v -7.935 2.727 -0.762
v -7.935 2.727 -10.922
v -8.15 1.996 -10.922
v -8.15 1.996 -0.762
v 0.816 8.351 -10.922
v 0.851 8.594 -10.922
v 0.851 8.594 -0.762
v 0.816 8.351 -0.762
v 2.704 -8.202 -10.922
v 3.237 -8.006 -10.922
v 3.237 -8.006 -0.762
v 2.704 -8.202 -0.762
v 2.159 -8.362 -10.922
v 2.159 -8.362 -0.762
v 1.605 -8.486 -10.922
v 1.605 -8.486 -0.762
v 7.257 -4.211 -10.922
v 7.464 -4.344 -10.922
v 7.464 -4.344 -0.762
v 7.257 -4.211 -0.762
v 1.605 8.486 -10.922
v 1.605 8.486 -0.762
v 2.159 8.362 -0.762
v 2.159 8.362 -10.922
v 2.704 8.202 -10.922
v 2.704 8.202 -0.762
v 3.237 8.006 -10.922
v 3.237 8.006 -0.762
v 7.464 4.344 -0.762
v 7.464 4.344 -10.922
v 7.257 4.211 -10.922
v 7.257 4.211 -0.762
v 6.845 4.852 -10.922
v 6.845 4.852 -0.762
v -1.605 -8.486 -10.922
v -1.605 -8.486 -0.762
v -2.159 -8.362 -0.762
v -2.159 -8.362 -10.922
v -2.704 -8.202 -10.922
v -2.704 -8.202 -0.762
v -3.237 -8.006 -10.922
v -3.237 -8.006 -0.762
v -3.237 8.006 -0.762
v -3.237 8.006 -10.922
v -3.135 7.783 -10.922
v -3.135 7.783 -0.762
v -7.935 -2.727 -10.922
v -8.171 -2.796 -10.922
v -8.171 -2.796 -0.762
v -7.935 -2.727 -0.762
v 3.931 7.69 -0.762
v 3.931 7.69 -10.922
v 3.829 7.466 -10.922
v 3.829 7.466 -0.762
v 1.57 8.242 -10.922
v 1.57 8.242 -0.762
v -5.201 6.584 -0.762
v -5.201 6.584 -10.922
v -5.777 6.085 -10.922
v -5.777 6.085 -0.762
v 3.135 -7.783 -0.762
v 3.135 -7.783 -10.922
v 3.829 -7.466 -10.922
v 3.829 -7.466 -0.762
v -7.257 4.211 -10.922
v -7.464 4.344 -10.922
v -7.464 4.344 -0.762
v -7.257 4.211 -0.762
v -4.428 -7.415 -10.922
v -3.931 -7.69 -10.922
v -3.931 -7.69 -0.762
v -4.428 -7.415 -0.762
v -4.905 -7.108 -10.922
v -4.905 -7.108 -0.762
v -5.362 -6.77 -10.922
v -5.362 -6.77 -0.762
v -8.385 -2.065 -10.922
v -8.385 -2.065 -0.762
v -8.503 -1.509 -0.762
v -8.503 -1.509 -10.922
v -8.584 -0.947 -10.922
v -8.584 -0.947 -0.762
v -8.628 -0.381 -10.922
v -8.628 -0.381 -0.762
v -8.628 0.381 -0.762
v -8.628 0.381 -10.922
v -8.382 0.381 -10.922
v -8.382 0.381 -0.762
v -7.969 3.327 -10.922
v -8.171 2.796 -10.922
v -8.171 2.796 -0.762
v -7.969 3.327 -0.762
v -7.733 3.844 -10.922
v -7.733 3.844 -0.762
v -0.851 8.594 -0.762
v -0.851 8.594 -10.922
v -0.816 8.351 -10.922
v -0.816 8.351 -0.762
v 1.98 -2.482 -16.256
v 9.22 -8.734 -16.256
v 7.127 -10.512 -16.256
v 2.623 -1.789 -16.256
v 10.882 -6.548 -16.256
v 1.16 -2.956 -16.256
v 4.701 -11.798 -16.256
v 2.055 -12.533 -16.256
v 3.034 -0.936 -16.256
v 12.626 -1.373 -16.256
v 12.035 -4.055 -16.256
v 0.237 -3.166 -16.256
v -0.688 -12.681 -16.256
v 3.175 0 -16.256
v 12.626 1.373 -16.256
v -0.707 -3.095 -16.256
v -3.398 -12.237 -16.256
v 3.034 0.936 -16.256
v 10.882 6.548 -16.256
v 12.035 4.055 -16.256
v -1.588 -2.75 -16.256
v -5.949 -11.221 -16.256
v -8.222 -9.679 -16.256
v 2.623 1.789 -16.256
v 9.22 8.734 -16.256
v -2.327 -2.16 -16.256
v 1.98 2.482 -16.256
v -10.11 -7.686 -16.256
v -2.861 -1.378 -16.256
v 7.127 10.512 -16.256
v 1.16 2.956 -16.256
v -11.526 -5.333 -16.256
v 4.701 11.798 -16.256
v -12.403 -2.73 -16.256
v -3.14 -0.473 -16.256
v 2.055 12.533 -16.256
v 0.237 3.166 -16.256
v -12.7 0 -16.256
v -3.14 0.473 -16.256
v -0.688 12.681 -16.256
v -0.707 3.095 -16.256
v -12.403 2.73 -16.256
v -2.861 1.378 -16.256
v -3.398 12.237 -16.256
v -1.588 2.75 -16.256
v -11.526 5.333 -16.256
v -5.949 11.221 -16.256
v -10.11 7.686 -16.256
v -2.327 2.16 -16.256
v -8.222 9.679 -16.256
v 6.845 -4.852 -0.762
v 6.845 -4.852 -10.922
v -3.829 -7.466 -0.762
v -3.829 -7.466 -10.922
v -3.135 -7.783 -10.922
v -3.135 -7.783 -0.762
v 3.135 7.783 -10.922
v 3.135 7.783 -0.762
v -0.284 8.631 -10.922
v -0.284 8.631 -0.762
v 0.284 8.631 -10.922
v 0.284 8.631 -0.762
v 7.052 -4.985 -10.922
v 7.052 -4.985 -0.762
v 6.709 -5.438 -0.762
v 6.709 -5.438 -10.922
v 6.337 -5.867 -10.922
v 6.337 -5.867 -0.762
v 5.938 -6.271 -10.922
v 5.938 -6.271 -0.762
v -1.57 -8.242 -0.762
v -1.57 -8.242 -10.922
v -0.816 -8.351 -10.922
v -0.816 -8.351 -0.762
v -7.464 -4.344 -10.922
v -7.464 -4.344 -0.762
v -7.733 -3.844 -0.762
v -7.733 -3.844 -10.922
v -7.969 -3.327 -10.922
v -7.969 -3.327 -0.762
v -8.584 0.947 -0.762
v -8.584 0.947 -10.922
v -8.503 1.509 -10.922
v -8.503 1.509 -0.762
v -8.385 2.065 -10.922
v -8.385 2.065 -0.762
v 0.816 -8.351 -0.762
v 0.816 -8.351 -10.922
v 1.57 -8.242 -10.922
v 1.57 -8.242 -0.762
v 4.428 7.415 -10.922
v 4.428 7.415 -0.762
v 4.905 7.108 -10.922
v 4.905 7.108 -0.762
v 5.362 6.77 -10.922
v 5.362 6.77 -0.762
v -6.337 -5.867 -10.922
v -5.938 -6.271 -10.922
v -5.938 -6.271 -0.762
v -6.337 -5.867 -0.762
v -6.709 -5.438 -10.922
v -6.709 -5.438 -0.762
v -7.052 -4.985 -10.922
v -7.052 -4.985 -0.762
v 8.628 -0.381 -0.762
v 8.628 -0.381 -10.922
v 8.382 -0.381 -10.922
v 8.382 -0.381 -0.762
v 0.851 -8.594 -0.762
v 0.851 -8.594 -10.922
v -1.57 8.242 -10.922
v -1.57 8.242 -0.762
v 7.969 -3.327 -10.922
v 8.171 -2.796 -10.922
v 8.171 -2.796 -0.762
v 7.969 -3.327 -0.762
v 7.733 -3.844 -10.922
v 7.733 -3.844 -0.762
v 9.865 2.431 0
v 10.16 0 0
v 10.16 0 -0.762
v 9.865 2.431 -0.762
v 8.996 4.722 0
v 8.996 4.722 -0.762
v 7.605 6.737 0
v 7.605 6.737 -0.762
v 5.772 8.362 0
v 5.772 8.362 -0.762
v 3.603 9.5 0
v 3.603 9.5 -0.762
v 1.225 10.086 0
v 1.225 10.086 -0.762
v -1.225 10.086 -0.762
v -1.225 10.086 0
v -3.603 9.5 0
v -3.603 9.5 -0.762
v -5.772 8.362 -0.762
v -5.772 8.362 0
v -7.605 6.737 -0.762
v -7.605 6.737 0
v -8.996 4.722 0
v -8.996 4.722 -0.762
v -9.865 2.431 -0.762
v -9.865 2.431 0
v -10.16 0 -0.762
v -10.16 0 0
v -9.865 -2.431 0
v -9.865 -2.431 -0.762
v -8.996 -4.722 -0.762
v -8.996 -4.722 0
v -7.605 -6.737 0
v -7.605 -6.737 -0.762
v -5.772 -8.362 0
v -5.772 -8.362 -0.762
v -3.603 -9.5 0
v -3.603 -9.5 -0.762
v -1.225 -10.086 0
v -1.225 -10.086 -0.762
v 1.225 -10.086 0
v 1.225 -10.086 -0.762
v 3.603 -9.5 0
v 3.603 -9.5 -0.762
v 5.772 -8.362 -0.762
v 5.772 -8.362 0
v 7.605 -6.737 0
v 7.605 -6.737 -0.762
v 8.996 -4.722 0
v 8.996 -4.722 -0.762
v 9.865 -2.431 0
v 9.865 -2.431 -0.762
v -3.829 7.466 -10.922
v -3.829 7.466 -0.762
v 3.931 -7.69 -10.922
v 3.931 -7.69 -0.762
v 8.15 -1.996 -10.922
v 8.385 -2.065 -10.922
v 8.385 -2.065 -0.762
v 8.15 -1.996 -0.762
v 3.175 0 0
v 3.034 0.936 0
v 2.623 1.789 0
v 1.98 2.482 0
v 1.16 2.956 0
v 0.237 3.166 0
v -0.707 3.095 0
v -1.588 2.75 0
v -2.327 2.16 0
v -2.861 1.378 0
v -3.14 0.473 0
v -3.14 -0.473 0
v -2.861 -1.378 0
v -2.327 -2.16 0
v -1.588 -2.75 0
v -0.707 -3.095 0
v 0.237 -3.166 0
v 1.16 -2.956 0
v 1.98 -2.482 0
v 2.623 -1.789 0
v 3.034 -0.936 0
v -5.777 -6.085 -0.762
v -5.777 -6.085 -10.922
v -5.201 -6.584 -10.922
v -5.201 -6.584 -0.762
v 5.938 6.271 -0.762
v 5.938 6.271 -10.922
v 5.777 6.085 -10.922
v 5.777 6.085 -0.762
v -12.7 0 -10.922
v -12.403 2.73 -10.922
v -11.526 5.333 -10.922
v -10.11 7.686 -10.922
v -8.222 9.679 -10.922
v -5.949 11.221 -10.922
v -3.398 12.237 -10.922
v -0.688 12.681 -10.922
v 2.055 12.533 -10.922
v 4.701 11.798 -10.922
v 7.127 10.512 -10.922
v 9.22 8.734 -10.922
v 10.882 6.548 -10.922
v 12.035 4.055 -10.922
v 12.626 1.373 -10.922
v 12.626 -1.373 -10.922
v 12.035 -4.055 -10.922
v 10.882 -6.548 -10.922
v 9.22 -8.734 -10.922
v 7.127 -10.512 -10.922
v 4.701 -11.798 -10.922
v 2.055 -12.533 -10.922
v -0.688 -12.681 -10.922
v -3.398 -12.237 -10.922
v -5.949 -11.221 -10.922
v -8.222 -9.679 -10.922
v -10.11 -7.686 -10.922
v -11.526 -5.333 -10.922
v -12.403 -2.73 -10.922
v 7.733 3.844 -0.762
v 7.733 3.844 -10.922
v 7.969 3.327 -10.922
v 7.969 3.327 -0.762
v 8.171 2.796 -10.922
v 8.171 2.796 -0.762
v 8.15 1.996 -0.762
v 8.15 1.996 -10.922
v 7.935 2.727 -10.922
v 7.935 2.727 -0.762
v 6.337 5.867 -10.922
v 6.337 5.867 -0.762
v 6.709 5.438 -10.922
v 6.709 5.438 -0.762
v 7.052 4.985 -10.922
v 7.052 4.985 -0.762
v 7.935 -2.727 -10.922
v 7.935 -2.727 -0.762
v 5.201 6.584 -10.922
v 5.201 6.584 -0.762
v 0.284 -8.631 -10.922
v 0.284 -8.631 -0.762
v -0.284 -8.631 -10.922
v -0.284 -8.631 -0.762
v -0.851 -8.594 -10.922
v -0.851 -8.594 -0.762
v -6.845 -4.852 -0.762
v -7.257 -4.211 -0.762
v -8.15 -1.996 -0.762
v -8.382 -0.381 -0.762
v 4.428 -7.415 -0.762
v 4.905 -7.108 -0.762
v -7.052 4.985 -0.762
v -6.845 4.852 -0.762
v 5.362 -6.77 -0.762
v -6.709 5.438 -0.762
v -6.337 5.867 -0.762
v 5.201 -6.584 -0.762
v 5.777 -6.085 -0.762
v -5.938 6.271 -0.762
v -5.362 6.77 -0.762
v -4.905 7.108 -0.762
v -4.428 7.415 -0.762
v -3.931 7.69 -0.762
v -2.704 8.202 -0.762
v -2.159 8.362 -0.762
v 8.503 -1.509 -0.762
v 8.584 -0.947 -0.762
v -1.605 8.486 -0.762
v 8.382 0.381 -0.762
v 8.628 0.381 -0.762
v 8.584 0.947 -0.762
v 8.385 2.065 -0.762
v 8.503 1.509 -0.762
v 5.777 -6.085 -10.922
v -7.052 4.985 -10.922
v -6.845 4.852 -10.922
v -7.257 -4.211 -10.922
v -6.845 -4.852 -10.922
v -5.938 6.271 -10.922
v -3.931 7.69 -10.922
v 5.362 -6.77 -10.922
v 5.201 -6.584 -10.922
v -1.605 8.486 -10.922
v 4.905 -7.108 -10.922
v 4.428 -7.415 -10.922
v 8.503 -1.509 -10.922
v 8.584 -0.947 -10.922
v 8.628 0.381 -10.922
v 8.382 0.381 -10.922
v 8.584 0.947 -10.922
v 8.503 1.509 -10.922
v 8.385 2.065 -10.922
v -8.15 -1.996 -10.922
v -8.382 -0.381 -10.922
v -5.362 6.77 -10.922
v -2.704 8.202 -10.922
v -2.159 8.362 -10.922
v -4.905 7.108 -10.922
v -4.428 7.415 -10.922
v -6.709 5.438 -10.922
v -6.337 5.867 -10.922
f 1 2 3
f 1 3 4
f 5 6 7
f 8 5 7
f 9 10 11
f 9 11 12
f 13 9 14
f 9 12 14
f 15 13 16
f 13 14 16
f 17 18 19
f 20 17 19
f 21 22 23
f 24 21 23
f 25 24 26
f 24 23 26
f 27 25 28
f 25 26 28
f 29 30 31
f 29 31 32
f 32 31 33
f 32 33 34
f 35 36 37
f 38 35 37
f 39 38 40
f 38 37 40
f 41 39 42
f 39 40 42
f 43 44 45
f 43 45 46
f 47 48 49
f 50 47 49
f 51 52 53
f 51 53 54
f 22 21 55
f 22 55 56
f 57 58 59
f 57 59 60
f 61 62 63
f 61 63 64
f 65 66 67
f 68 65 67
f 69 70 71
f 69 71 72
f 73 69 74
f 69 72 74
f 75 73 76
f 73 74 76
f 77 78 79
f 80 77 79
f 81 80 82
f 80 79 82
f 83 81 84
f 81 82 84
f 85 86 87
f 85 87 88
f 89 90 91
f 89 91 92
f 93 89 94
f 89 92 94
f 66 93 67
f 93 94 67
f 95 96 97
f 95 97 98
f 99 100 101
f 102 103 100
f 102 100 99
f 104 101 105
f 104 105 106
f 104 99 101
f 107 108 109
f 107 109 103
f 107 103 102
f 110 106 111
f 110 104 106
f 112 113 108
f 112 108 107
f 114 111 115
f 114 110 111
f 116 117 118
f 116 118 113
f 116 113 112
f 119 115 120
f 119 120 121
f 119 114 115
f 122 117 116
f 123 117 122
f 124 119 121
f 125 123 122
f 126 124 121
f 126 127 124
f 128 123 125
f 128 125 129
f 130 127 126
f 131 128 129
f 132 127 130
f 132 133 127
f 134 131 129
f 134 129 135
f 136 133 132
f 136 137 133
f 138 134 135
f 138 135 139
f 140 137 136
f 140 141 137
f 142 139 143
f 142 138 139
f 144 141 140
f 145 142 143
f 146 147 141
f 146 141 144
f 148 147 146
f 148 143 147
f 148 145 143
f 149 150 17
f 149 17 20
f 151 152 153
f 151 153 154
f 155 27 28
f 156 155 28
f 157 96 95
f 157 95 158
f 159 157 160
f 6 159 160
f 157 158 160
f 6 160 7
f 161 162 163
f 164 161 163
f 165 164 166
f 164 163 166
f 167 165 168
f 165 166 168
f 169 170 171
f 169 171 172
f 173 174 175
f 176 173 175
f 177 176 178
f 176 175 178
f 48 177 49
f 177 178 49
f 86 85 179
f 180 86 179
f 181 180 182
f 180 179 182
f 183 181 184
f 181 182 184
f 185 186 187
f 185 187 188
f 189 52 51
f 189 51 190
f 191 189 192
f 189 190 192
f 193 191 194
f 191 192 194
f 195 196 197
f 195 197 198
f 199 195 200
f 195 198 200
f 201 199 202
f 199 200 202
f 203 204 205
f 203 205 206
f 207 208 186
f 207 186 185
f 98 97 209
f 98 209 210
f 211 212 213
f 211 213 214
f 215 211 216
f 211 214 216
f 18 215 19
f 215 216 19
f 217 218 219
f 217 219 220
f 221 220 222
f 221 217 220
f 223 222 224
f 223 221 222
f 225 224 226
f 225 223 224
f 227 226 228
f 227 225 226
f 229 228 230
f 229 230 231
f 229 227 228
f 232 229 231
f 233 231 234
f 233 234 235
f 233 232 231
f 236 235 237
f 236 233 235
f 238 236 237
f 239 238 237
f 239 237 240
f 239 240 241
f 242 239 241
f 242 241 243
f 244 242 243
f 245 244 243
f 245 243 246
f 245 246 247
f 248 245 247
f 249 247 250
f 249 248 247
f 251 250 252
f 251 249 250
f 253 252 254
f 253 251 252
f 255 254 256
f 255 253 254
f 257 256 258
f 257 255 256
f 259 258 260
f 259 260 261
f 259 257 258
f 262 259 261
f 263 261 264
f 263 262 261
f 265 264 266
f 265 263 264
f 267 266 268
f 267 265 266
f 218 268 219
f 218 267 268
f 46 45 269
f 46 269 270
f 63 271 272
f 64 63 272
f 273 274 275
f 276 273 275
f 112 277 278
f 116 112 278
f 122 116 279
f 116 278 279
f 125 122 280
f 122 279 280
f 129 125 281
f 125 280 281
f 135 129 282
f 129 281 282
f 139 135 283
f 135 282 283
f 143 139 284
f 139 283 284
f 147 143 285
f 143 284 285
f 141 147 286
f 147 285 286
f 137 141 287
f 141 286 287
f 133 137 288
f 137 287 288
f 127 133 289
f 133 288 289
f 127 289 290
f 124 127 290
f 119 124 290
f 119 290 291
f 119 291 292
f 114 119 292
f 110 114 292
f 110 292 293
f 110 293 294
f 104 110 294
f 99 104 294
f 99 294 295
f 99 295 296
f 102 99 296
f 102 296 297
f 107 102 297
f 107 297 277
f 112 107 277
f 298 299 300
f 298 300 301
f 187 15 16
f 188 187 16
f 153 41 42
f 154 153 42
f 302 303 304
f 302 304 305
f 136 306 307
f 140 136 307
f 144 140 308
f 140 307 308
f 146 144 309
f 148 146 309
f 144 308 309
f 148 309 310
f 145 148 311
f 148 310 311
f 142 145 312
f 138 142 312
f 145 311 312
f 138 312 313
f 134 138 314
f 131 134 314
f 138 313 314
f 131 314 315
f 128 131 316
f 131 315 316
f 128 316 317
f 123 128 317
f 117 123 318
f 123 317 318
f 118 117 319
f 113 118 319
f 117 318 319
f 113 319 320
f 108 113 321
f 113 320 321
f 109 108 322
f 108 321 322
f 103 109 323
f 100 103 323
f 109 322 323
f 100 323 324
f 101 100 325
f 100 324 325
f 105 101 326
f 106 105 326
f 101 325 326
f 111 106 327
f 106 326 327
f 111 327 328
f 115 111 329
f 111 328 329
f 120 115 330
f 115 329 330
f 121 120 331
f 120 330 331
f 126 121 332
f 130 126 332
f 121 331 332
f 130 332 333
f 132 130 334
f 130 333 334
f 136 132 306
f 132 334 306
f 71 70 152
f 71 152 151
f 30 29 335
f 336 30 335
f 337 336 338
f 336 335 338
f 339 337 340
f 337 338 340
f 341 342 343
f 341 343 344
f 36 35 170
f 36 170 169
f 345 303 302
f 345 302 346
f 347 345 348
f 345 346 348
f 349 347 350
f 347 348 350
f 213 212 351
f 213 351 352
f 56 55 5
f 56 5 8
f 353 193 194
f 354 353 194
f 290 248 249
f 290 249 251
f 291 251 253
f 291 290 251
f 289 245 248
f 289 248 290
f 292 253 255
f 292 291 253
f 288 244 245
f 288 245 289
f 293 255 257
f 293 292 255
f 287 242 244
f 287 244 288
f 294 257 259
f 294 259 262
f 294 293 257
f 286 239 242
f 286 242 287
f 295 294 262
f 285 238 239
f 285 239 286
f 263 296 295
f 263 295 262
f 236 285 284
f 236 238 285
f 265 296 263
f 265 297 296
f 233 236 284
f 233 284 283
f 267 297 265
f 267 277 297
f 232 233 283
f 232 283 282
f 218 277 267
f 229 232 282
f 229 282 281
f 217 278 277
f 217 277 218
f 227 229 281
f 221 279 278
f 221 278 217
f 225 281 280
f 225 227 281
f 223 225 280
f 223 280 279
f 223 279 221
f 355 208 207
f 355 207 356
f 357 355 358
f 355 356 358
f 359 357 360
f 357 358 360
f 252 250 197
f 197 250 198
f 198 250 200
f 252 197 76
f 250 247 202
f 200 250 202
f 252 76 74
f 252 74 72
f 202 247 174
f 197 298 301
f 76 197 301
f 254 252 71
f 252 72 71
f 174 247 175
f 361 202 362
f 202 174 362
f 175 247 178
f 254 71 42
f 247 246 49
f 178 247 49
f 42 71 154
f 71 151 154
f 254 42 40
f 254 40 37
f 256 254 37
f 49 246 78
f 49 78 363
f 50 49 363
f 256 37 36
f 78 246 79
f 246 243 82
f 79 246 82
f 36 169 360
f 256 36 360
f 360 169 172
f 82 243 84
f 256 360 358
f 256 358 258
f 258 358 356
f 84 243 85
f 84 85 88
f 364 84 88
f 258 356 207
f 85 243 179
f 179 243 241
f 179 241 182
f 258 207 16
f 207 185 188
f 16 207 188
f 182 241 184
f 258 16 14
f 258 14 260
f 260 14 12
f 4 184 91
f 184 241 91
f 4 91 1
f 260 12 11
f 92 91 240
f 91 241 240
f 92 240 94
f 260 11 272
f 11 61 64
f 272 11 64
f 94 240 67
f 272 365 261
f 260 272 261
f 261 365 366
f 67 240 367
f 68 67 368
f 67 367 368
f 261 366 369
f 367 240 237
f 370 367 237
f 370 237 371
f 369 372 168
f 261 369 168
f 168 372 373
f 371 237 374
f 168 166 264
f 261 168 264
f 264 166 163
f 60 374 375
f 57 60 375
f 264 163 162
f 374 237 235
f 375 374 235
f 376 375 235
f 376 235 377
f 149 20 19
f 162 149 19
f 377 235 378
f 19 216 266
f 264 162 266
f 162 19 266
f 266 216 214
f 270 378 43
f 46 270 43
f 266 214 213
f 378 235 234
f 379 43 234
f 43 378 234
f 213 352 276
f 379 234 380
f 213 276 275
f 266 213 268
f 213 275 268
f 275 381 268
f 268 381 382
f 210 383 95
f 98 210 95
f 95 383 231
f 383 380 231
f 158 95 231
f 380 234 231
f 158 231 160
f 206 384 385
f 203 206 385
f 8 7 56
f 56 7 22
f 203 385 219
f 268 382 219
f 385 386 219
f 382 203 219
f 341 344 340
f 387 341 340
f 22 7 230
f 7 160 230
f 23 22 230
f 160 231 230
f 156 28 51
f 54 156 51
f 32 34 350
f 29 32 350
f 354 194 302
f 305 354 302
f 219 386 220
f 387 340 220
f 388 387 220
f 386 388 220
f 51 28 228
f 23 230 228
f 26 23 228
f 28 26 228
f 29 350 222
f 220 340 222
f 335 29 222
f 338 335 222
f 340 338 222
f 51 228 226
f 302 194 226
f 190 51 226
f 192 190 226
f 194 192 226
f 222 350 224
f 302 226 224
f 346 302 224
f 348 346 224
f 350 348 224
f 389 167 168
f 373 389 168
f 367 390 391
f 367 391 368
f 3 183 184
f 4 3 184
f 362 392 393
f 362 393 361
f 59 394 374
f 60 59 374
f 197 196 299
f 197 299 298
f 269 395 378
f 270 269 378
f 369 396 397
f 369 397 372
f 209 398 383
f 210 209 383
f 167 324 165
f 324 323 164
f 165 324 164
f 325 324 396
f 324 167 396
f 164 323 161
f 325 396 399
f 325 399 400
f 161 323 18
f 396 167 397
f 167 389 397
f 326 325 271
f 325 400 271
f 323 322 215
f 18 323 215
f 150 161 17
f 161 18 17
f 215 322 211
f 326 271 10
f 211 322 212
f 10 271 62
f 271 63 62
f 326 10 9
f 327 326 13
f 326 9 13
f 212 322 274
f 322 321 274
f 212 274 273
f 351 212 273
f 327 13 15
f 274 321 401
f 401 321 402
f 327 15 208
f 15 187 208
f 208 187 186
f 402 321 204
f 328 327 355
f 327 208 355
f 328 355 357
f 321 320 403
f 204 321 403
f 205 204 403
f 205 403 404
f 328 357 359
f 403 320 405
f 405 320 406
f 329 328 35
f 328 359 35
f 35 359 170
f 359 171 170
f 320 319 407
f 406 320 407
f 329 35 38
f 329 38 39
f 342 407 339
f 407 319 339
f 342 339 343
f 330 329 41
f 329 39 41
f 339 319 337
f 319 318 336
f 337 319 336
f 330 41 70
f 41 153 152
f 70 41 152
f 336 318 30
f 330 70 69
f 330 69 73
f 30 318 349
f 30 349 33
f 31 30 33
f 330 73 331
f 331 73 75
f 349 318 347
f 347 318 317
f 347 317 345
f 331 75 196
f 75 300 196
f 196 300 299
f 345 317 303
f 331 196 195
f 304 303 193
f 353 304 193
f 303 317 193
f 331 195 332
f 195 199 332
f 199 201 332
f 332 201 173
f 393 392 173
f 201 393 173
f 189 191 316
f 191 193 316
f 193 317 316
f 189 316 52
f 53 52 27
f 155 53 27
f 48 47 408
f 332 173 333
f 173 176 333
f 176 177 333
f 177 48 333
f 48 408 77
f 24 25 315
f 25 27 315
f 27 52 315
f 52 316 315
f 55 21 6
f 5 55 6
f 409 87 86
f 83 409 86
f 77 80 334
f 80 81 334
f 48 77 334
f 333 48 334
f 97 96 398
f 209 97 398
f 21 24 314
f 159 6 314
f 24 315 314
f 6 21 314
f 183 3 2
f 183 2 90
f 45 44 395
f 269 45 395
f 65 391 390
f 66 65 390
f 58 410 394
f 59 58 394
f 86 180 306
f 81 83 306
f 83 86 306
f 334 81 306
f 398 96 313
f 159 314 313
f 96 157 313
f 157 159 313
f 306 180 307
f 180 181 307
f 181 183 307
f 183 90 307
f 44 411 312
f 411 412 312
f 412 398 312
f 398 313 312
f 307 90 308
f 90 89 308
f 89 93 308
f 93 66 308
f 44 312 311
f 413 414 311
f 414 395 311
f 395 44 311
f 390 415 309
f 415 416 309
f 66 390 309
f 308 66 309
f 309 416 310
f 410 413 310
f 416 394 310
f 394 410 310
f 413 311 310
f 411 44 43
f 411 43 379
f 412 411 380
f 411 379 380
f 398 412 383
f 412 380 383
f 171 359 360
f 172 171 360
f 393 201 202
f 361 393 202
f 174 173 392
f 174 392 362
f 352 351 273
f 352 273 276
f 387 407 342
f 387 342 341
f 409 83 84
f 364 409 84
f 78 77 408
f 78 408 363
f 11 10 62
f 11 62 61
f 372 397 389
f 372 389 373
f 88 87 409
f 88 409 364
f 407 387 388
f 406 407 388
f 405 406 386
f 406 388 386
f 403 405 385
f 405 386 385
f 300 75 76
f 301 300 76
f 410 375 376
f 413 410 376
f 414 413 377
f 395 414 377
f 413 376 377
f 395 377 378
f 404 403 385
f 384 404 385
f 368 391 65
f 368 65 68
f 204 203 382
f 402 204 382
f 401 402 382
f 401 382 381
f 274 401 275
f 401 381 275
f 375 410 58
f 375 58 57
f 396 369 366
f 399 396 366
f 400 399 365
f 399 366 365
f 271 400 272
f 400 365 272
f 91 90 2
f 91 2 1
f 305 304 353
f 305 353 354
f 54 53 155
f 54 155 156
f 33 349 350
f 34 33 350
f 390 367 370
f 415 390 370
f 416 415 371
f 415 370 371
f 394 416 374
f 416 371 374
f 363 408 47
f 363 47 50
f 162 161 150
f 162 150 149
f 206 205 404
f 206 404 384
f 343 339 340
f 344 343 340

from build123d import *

# Parameters (mm, degrees)
SKETCH1_R           = 10.16
BOSS_EXTRUDE1_DEPTH = 0.762
SKETCH2_R           = 8.636
BOSS_EXTRUDE2_DEPTH = 10.16
SKETCH3_R           = 12.7
BOSS_EXTRUDE3_DEPTH = 5.334
SKETCH4_R           = 3.175
CUT_EXTRUDE1_DEPTH  = 25.654
SKETCH5_W           = 10.16
SKETCH5_H           = 0.762
CUT_EXTRUDE2_DEPTH  = 0.254
CIRPATTERN1_COUNT   = 22


with BuildPart() as part:
    # Sketch1 → Boss-Extrude1 (new body)
    with BuildSketch(Plane.XY):
        Circle(SKETCH1_R)
    extrude(amount=-BOSS_EXTRUDE1_DEPTH)

    # Sketch2 → Boss-Extrude2 (add)
    with BuildSketch(Plane(origin=(0, 0, -0.762), x_dir=(-1, 0, 0), z_dir=(0, 0, -1))):
        Circle(SKETCH2_R)
    extrude(amount=BOSS_EXTRUDE2_DEPTH)

    # Sketch3 → Boss-Extrude3 (add)
    with BuildSketch(Plane(origin=(0, 0, -10.922), x_dir=(-1, 0, 0), z_dir=(0, 0, -1))):
        Circle(SKETCH3_R)
    extrude(amount=BOSS_EXTRUDE3_DEPTH)

    # Sketch4 → Cut-Extrude1 (cut)
    with BuildSketch(Plane.XY):
        Circle(SKETCH4_R)
    extrude(amount=-CUT_EXTRUDE1_DEPTH, mode=Mode.SUBTRACT)

    # Sketch5 → Cut-Extrude2 (cut)
    with BuildSketch(Plane.ZY.offset(8.636)):
        with Locations((-5.842, 0)):
            Rectangle(SKETCH5_W, SKETCH5_H)
    cut_extrude2 = extrude(amount=-CUT_EXTRUDE2_DEPTH, mode=Mode.SUBTRACT)

    # CirPattern1: Cut-Extrude2 ×22 about axis
    cirpattern1_axis = Axis((0, 0, -16.256), (0, 0, 1))
    for i in range(1, CIRPATTERN1_COUNT):
        add(cut_extrude2.rotate(cirpattern1_axis, i * 360 / CIRPATTERN1_COUNT), mode=Mode.SUBTRACT)


solid = part.part
